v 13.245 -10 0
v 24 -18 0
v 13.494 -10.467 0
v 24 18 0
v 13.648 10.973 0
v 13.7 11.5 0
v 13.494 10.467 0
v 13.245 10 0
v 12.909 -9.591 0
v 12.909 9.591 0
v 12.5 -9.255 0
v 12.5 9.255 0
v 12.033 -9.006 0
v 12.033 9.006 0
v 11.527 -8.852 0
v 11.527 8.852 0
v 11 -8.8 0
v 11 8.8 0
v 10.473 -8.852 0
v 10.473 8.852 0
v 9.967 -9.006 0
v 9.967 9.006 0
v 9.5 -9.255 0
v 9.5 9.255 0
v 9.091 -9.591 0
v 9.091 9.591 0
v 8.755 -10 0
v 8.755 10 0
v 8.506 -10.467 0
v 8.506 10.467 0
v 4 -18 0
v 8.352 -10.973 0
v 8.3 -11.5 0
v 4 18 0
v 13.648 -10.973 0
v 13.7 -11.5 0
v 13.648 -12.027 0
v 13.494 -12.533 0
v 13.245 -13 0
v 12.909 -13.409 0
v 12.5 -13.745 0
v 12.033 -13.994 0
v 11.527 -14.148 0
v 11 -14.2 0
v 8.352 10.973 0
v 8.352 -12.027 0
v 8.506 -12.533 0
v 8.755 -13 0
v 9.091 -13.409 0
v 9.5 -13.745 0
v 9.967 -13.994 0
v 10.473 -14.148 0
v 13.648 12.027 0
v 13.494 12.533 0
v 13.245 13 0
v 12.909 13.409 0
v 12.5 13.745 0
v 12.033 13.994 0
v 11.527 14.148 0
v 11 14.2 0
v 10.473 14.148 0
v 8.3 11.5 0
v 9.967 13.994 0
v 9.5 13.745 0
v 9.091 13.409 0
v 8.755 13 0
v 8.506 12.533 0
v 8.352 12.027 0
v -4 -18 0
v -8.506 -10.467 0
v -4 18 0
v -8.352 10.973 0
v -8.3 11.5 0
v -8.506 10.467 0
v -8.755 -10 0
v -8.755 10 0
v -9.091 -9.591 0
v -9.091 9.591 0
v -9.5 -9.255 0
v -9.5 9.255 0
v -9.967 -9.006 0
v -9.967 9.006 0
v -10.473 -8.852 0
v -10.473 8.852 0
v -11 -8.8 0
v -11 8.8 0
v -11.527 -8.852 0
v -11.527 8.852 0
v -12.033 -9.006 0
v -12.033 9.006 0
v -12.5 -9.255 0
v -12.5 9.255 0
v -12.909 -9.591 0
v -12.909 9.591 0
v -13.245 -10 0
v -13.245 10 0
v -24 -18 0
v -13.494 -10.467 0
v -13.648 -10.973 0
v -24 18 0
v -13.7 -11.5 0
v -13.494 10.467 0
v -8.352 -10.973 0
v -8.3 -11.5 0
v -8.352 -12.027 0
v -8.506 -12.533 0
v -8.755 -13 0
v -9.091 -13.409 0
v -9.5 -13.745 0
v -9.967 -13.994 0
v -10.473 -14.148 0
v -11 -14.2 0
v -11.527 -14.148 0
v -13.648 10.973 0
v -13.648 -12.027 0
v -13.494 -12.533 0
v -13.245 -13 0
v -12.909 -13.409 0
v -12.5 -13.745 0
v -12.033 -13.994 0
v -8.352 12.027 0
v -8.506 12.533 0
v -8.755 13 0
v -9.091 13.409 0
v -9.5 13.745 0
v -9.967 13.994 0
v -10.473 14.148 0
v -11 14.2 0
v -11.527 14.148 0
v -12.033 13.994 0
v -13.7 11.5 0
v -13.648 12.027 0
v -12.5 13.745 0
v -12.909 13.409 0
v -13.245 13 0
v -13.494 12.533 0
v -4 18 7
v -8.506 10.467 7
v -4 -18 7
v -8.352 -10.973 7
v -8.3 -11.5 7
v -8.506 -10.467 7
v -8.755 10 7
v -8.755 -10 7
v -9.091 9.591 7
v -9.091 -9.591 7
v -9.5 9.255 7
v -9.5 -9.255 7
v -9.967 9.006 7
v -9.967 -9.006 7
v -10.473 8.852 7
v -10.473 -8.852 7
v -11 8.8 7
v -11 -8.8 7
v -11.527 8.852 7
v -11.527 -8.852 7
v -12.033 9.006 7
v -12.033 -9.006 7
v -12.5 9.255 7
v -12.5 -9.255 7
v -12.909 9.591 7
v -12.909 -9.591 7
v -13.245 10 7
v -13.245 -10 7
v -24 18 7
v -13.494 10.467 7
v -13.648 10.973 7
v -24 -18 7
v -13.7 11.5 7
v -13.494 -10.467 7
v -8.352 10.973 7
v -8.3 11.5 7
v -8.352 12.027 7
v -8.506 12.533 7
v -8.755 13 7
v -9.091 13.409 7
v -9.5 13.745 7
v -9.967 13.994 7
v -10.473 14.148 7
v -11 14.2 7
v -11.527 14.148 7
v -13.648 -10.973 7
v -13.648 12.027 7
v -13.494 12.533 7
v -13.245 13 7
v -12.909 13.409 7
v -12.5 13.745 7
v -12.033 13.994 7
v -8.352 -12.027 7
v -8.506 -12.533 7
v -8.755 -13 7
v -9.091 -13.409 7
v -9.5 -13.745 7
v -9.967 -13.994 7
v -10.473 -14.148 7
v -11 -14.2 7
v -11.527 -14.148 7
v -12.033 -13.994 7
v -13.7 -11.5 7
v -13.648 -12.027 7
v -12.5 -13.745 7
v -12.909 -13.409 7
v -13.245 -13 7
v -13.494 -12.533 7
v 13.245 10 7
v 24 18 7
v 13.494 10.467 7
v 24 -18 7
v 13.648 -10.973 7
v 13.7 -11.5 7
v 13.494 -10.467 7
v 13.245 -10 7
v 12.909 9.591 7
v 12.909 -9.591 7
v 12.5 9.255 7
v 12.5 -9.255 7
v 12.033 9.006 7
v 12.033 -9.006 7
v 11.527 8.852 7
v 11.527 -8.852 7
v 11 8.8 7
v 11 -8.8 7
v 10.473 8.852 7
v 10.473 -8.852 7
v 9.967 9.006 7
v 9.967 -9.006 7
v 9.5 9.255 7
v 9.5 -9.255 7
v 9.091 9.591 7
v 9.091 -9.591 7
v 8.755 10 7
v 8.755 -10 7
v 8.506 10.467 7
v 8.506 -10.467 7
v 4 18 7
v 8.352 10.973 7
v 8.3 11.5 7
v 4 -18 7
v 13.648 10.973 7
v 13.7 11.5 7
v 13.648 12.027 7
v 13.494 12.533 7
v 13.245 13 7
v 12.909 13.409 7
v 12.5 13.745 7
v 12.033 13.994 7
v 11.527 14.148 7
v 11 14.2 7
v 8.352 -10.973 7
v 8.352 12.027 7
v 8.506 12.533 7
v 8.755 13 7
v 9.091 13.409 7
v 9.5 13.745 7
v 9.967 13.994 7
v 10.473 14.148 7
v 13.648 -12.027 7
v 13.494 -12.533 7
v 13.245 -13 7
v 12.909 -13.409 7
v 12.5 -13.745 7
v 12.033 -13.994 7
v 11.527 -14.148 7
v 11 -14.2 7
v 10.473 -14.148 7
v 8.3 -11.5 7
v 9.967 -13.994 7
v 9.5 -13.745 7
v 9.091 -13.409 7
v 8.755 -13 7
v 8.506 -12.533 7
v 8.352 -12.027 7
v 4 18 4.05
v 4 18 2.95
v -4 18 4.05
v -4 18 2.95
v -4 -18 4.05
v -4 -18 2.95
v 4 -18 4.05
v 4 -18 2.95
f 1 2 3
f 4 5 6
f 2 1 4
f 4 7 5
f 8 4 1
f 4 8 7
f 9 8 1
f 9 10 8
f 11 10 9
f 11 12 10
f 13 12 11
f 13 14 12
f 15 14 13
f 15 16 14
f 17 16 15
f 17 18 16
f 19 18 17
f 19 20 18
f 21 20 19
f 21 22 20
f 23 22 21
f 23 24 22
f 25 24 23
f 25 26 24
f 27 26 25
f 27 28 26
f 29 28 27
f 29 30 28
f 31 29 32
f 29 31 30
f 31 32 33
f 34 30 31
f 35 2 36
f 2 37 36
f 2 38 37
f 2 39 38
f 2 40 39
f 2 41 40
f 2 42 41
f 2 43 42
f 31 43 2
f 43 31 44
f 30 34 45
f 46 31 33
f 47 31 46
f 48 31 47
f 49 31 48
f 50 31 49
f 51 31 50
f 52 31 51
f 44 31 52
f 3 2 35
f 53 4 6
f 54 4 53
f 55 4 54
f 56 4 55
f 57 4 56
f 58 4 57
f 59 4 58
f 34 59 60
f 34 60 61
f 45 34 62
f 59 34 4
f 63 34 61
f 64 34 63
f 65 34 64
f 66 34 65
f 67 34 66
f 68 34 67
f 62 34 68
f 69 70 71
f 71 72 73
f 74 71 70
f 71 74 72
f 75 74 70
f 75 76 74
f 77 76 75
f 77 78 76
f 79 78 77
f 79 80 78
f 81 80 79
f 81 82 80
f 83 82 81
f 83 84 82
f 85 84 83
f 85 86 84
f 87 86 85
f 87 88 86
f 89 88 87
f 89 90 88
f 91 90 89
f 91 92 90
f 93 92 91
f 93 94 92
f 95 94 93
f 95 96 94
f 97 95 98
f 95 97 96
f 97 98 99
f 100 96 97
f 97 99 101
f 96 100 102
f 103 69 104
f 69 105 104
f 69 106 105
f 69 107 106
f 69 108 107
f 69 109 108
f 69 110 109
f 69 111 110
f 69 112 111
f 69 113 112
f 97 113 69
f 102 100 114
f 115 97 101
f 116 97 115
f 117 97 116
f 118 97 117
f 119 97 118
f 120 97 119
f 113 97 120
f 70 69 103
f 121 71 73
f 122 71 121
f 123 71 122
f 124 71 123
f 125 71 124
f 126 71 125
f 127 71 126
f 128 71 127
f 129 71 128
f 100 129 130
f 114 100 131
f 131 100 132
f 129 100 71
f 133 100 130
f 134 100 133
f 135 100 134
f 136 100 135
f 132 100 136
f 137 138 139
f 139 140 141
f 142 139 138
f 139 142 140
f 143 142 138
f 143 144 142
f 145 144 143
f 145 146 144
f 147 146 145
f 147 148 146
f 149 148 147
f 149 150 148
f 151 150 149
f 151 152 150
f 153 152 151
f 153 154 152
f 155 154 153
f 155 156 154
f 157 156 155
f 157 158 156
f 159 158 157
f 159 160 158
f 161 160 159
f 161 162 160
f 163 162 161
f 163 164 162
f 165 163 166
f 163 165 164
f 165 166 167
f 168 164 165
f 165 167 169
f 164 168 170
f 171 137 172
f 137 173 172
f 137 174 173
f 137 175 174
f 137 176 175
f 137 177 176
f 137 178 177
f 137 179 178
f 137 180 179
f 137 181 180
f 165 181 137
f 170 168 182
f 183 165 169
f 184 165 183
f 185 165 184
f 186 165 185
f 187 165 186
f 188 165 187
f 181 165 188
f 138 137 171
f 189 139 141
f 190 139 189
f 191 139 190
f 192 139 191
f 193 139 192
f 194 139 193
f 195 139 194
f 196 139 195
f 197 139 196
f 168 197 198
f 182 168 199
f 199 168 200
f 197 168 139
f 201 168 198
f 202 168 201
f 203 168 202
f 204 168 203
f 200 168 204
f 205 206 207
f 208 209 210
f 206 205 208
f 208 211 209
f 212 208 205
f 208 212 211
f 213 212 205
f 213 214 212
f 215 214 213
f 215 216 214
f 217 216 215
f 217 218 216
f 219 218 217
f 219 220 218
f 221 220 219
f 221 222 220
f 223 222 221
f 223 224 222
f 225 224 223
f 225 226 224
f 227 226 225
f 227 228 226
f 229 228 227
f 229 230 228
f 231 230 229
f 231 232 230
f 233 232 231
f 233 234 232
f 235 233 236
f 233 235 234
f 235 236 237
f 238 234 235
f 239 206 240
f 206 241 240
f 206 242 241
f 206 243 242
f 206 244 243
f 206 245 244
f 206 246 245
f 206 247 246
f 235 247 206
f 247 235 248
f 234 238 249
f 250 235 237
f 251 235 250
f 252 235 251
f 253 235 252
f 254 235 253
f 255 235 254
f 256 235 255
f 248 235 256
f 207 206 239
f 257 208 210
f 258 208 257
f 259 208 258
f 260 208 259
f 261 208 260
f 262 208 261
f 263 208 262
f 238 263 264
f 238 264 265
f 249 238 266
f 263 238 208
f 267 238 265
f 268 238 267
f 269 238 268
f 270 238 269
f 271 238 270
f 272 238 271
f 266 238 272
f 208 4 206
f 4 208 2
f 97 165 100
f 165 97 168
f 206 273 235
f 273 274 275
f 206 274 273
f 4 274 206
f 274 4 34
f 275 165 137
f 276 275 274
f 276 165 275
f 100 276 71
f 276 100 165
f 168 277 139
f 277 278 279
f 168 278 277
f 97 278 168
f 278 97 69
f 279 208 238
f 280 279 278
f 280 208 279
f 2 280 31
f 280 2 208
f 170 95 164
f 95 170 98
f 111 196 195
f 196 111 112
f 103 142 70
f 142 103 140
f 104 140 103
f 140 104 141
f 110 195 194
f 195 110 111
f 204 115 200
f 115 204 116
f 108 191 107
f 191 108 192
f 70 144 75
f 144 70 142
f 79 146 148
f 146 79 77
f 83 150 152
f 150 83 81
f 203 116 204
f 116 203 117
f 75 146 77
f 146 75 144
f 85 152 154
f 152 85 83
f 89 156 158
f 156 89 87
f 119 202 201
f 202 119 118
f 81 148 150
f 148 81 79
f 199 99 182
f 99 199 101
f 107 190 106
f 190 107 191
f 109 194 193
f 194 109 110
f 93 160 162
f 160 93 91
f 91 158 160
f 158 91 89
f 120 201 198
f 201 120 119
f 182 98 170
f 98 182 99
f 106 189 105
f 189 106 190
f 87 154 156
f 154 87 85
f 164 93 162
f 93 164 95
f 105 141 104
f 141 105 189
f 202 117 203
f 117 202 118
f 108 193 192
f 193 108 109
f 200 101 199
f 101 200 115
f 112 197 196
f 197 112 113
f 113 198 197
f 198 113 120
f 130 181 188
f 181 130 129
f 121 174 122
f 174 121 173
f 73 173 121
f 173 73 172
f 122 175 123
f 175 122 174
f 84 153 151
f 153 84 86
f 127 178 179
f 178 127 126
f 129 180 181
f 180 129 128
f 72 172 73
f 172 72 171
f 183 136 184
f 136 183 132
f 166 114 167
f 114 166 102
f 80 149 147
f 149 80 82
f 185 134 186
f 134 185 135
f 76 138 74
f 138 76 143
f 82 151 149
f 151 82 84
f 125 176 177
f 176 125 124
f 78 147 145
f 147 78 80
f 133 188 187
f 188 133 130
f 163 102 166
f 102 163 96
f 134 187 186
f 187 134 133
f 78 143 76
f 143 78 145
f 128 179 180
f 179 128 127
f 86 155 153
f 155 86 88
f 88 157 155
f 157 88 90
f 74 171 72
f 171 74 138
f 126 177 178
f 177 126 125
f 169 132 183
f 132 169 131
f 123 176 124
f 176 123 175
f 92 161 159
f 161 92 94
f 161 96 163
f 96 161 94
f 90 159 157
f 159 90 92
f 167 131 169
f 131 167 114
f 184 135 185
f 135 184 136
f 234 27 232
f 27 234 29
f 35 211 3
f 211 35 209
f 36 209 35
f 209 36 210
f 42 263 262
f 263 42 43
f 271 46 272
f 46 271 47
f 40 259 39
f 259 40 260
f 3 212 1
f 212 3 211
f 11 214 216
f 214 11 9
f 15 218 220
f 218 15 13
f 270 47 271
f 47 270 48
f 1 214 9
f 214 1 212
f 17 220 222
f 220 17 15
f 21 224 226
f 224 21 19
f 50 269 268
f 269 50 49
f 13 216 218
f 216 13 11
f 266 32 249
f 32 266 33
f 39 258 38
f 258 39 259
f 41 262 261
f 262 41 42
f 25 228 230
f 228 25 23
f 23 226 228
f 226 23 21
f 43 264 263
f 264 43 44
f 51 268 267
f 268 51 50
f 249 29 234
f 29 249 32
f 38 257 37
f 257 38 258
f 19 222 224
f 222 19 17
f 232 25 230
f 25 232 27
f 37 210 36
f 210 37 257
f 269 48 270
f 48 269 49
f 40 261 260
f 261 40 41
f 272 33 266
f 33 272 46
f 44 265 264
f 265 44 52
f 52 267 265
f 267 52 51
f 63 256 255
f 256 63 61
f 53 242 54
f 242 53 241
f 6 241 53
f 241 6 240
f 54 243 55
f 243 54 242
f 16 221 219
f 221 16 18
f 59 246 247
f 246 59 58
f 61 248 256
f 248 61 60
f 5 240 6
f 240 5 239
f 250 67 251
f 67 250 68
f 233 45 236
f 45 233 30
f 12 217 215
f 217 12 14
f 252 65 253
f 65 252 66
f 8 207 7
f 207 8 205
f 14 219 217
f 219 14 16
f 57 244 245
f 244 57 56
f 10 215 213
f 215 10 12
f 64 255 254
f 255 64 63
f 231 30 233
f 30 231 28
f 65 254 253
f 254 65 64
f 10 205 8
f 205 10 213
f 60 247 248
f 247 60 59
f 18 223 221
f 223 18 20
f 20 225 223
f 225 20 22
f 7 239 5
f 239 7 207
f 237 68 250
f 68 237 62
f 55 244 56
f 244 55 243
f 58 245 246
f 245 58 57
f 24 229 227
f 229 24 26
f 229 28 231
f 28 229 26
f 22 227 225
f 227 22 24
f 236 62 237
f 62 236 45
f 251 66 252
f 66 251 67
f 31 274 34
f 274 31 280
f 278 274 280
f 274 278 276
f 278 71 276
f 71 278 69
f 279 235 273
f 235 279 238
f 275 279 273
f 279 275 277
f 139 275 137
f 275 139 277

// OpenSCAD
$fn = 32;

// ----------------------------------------------------------------------
// Living hinge: 48 x 36 mm plates, 1.1 mm flexible web
// ----------------------------------------------------------------------

// --- parameters (mm) ---
plate_len = 20;           // plate length outside the web
plate_w = 36;             // plate width
thick = 7;                // plate thickness
web_half = 4;             // half width of the flex band
web_t = 1.1;              // flexible web thickness
web_z = 2.95;             // web position inside the thickness
boss_d = 9;               // screw boss diameter
boss_h = 7;               // screw boss height
boss_x = 11;              // screw boss distance from the web
screw_d = 5.4;            // screw hole

difference() {
  union() {
    /* one flat strip, later thinned at the middle */
    translate([-24, -18, 0]) cube([48, 36, 7]);
    /* screw bosses, sunk 0.5 mm into the plates */
    for (sx = [-11, 11]) {
      for (sy = [-11.5, 11.5]) {
        translate([sx, sy, 0]) cylinder(h = boss_h, d = boss_d);
      }
    }
  }
  /* channel from below: leaves the web on top of it */
  translate([-4, -20.5, -2.5]) cube([8, 41, 5.45]);
  /* channel from above: thins the web down to web_t */
  translate([-4, -20.5, 4.05]) cube([8, 41, 5.45]);
  /* screw holes through the bosses */
  for (sx = [-11, 11]) {
    for (sy = [-11.5, 11.5]) {
      translate([sx, sy, -2.5]) cylinder(h = boss_h + 5, d = screw_d);
    }
  }
}
